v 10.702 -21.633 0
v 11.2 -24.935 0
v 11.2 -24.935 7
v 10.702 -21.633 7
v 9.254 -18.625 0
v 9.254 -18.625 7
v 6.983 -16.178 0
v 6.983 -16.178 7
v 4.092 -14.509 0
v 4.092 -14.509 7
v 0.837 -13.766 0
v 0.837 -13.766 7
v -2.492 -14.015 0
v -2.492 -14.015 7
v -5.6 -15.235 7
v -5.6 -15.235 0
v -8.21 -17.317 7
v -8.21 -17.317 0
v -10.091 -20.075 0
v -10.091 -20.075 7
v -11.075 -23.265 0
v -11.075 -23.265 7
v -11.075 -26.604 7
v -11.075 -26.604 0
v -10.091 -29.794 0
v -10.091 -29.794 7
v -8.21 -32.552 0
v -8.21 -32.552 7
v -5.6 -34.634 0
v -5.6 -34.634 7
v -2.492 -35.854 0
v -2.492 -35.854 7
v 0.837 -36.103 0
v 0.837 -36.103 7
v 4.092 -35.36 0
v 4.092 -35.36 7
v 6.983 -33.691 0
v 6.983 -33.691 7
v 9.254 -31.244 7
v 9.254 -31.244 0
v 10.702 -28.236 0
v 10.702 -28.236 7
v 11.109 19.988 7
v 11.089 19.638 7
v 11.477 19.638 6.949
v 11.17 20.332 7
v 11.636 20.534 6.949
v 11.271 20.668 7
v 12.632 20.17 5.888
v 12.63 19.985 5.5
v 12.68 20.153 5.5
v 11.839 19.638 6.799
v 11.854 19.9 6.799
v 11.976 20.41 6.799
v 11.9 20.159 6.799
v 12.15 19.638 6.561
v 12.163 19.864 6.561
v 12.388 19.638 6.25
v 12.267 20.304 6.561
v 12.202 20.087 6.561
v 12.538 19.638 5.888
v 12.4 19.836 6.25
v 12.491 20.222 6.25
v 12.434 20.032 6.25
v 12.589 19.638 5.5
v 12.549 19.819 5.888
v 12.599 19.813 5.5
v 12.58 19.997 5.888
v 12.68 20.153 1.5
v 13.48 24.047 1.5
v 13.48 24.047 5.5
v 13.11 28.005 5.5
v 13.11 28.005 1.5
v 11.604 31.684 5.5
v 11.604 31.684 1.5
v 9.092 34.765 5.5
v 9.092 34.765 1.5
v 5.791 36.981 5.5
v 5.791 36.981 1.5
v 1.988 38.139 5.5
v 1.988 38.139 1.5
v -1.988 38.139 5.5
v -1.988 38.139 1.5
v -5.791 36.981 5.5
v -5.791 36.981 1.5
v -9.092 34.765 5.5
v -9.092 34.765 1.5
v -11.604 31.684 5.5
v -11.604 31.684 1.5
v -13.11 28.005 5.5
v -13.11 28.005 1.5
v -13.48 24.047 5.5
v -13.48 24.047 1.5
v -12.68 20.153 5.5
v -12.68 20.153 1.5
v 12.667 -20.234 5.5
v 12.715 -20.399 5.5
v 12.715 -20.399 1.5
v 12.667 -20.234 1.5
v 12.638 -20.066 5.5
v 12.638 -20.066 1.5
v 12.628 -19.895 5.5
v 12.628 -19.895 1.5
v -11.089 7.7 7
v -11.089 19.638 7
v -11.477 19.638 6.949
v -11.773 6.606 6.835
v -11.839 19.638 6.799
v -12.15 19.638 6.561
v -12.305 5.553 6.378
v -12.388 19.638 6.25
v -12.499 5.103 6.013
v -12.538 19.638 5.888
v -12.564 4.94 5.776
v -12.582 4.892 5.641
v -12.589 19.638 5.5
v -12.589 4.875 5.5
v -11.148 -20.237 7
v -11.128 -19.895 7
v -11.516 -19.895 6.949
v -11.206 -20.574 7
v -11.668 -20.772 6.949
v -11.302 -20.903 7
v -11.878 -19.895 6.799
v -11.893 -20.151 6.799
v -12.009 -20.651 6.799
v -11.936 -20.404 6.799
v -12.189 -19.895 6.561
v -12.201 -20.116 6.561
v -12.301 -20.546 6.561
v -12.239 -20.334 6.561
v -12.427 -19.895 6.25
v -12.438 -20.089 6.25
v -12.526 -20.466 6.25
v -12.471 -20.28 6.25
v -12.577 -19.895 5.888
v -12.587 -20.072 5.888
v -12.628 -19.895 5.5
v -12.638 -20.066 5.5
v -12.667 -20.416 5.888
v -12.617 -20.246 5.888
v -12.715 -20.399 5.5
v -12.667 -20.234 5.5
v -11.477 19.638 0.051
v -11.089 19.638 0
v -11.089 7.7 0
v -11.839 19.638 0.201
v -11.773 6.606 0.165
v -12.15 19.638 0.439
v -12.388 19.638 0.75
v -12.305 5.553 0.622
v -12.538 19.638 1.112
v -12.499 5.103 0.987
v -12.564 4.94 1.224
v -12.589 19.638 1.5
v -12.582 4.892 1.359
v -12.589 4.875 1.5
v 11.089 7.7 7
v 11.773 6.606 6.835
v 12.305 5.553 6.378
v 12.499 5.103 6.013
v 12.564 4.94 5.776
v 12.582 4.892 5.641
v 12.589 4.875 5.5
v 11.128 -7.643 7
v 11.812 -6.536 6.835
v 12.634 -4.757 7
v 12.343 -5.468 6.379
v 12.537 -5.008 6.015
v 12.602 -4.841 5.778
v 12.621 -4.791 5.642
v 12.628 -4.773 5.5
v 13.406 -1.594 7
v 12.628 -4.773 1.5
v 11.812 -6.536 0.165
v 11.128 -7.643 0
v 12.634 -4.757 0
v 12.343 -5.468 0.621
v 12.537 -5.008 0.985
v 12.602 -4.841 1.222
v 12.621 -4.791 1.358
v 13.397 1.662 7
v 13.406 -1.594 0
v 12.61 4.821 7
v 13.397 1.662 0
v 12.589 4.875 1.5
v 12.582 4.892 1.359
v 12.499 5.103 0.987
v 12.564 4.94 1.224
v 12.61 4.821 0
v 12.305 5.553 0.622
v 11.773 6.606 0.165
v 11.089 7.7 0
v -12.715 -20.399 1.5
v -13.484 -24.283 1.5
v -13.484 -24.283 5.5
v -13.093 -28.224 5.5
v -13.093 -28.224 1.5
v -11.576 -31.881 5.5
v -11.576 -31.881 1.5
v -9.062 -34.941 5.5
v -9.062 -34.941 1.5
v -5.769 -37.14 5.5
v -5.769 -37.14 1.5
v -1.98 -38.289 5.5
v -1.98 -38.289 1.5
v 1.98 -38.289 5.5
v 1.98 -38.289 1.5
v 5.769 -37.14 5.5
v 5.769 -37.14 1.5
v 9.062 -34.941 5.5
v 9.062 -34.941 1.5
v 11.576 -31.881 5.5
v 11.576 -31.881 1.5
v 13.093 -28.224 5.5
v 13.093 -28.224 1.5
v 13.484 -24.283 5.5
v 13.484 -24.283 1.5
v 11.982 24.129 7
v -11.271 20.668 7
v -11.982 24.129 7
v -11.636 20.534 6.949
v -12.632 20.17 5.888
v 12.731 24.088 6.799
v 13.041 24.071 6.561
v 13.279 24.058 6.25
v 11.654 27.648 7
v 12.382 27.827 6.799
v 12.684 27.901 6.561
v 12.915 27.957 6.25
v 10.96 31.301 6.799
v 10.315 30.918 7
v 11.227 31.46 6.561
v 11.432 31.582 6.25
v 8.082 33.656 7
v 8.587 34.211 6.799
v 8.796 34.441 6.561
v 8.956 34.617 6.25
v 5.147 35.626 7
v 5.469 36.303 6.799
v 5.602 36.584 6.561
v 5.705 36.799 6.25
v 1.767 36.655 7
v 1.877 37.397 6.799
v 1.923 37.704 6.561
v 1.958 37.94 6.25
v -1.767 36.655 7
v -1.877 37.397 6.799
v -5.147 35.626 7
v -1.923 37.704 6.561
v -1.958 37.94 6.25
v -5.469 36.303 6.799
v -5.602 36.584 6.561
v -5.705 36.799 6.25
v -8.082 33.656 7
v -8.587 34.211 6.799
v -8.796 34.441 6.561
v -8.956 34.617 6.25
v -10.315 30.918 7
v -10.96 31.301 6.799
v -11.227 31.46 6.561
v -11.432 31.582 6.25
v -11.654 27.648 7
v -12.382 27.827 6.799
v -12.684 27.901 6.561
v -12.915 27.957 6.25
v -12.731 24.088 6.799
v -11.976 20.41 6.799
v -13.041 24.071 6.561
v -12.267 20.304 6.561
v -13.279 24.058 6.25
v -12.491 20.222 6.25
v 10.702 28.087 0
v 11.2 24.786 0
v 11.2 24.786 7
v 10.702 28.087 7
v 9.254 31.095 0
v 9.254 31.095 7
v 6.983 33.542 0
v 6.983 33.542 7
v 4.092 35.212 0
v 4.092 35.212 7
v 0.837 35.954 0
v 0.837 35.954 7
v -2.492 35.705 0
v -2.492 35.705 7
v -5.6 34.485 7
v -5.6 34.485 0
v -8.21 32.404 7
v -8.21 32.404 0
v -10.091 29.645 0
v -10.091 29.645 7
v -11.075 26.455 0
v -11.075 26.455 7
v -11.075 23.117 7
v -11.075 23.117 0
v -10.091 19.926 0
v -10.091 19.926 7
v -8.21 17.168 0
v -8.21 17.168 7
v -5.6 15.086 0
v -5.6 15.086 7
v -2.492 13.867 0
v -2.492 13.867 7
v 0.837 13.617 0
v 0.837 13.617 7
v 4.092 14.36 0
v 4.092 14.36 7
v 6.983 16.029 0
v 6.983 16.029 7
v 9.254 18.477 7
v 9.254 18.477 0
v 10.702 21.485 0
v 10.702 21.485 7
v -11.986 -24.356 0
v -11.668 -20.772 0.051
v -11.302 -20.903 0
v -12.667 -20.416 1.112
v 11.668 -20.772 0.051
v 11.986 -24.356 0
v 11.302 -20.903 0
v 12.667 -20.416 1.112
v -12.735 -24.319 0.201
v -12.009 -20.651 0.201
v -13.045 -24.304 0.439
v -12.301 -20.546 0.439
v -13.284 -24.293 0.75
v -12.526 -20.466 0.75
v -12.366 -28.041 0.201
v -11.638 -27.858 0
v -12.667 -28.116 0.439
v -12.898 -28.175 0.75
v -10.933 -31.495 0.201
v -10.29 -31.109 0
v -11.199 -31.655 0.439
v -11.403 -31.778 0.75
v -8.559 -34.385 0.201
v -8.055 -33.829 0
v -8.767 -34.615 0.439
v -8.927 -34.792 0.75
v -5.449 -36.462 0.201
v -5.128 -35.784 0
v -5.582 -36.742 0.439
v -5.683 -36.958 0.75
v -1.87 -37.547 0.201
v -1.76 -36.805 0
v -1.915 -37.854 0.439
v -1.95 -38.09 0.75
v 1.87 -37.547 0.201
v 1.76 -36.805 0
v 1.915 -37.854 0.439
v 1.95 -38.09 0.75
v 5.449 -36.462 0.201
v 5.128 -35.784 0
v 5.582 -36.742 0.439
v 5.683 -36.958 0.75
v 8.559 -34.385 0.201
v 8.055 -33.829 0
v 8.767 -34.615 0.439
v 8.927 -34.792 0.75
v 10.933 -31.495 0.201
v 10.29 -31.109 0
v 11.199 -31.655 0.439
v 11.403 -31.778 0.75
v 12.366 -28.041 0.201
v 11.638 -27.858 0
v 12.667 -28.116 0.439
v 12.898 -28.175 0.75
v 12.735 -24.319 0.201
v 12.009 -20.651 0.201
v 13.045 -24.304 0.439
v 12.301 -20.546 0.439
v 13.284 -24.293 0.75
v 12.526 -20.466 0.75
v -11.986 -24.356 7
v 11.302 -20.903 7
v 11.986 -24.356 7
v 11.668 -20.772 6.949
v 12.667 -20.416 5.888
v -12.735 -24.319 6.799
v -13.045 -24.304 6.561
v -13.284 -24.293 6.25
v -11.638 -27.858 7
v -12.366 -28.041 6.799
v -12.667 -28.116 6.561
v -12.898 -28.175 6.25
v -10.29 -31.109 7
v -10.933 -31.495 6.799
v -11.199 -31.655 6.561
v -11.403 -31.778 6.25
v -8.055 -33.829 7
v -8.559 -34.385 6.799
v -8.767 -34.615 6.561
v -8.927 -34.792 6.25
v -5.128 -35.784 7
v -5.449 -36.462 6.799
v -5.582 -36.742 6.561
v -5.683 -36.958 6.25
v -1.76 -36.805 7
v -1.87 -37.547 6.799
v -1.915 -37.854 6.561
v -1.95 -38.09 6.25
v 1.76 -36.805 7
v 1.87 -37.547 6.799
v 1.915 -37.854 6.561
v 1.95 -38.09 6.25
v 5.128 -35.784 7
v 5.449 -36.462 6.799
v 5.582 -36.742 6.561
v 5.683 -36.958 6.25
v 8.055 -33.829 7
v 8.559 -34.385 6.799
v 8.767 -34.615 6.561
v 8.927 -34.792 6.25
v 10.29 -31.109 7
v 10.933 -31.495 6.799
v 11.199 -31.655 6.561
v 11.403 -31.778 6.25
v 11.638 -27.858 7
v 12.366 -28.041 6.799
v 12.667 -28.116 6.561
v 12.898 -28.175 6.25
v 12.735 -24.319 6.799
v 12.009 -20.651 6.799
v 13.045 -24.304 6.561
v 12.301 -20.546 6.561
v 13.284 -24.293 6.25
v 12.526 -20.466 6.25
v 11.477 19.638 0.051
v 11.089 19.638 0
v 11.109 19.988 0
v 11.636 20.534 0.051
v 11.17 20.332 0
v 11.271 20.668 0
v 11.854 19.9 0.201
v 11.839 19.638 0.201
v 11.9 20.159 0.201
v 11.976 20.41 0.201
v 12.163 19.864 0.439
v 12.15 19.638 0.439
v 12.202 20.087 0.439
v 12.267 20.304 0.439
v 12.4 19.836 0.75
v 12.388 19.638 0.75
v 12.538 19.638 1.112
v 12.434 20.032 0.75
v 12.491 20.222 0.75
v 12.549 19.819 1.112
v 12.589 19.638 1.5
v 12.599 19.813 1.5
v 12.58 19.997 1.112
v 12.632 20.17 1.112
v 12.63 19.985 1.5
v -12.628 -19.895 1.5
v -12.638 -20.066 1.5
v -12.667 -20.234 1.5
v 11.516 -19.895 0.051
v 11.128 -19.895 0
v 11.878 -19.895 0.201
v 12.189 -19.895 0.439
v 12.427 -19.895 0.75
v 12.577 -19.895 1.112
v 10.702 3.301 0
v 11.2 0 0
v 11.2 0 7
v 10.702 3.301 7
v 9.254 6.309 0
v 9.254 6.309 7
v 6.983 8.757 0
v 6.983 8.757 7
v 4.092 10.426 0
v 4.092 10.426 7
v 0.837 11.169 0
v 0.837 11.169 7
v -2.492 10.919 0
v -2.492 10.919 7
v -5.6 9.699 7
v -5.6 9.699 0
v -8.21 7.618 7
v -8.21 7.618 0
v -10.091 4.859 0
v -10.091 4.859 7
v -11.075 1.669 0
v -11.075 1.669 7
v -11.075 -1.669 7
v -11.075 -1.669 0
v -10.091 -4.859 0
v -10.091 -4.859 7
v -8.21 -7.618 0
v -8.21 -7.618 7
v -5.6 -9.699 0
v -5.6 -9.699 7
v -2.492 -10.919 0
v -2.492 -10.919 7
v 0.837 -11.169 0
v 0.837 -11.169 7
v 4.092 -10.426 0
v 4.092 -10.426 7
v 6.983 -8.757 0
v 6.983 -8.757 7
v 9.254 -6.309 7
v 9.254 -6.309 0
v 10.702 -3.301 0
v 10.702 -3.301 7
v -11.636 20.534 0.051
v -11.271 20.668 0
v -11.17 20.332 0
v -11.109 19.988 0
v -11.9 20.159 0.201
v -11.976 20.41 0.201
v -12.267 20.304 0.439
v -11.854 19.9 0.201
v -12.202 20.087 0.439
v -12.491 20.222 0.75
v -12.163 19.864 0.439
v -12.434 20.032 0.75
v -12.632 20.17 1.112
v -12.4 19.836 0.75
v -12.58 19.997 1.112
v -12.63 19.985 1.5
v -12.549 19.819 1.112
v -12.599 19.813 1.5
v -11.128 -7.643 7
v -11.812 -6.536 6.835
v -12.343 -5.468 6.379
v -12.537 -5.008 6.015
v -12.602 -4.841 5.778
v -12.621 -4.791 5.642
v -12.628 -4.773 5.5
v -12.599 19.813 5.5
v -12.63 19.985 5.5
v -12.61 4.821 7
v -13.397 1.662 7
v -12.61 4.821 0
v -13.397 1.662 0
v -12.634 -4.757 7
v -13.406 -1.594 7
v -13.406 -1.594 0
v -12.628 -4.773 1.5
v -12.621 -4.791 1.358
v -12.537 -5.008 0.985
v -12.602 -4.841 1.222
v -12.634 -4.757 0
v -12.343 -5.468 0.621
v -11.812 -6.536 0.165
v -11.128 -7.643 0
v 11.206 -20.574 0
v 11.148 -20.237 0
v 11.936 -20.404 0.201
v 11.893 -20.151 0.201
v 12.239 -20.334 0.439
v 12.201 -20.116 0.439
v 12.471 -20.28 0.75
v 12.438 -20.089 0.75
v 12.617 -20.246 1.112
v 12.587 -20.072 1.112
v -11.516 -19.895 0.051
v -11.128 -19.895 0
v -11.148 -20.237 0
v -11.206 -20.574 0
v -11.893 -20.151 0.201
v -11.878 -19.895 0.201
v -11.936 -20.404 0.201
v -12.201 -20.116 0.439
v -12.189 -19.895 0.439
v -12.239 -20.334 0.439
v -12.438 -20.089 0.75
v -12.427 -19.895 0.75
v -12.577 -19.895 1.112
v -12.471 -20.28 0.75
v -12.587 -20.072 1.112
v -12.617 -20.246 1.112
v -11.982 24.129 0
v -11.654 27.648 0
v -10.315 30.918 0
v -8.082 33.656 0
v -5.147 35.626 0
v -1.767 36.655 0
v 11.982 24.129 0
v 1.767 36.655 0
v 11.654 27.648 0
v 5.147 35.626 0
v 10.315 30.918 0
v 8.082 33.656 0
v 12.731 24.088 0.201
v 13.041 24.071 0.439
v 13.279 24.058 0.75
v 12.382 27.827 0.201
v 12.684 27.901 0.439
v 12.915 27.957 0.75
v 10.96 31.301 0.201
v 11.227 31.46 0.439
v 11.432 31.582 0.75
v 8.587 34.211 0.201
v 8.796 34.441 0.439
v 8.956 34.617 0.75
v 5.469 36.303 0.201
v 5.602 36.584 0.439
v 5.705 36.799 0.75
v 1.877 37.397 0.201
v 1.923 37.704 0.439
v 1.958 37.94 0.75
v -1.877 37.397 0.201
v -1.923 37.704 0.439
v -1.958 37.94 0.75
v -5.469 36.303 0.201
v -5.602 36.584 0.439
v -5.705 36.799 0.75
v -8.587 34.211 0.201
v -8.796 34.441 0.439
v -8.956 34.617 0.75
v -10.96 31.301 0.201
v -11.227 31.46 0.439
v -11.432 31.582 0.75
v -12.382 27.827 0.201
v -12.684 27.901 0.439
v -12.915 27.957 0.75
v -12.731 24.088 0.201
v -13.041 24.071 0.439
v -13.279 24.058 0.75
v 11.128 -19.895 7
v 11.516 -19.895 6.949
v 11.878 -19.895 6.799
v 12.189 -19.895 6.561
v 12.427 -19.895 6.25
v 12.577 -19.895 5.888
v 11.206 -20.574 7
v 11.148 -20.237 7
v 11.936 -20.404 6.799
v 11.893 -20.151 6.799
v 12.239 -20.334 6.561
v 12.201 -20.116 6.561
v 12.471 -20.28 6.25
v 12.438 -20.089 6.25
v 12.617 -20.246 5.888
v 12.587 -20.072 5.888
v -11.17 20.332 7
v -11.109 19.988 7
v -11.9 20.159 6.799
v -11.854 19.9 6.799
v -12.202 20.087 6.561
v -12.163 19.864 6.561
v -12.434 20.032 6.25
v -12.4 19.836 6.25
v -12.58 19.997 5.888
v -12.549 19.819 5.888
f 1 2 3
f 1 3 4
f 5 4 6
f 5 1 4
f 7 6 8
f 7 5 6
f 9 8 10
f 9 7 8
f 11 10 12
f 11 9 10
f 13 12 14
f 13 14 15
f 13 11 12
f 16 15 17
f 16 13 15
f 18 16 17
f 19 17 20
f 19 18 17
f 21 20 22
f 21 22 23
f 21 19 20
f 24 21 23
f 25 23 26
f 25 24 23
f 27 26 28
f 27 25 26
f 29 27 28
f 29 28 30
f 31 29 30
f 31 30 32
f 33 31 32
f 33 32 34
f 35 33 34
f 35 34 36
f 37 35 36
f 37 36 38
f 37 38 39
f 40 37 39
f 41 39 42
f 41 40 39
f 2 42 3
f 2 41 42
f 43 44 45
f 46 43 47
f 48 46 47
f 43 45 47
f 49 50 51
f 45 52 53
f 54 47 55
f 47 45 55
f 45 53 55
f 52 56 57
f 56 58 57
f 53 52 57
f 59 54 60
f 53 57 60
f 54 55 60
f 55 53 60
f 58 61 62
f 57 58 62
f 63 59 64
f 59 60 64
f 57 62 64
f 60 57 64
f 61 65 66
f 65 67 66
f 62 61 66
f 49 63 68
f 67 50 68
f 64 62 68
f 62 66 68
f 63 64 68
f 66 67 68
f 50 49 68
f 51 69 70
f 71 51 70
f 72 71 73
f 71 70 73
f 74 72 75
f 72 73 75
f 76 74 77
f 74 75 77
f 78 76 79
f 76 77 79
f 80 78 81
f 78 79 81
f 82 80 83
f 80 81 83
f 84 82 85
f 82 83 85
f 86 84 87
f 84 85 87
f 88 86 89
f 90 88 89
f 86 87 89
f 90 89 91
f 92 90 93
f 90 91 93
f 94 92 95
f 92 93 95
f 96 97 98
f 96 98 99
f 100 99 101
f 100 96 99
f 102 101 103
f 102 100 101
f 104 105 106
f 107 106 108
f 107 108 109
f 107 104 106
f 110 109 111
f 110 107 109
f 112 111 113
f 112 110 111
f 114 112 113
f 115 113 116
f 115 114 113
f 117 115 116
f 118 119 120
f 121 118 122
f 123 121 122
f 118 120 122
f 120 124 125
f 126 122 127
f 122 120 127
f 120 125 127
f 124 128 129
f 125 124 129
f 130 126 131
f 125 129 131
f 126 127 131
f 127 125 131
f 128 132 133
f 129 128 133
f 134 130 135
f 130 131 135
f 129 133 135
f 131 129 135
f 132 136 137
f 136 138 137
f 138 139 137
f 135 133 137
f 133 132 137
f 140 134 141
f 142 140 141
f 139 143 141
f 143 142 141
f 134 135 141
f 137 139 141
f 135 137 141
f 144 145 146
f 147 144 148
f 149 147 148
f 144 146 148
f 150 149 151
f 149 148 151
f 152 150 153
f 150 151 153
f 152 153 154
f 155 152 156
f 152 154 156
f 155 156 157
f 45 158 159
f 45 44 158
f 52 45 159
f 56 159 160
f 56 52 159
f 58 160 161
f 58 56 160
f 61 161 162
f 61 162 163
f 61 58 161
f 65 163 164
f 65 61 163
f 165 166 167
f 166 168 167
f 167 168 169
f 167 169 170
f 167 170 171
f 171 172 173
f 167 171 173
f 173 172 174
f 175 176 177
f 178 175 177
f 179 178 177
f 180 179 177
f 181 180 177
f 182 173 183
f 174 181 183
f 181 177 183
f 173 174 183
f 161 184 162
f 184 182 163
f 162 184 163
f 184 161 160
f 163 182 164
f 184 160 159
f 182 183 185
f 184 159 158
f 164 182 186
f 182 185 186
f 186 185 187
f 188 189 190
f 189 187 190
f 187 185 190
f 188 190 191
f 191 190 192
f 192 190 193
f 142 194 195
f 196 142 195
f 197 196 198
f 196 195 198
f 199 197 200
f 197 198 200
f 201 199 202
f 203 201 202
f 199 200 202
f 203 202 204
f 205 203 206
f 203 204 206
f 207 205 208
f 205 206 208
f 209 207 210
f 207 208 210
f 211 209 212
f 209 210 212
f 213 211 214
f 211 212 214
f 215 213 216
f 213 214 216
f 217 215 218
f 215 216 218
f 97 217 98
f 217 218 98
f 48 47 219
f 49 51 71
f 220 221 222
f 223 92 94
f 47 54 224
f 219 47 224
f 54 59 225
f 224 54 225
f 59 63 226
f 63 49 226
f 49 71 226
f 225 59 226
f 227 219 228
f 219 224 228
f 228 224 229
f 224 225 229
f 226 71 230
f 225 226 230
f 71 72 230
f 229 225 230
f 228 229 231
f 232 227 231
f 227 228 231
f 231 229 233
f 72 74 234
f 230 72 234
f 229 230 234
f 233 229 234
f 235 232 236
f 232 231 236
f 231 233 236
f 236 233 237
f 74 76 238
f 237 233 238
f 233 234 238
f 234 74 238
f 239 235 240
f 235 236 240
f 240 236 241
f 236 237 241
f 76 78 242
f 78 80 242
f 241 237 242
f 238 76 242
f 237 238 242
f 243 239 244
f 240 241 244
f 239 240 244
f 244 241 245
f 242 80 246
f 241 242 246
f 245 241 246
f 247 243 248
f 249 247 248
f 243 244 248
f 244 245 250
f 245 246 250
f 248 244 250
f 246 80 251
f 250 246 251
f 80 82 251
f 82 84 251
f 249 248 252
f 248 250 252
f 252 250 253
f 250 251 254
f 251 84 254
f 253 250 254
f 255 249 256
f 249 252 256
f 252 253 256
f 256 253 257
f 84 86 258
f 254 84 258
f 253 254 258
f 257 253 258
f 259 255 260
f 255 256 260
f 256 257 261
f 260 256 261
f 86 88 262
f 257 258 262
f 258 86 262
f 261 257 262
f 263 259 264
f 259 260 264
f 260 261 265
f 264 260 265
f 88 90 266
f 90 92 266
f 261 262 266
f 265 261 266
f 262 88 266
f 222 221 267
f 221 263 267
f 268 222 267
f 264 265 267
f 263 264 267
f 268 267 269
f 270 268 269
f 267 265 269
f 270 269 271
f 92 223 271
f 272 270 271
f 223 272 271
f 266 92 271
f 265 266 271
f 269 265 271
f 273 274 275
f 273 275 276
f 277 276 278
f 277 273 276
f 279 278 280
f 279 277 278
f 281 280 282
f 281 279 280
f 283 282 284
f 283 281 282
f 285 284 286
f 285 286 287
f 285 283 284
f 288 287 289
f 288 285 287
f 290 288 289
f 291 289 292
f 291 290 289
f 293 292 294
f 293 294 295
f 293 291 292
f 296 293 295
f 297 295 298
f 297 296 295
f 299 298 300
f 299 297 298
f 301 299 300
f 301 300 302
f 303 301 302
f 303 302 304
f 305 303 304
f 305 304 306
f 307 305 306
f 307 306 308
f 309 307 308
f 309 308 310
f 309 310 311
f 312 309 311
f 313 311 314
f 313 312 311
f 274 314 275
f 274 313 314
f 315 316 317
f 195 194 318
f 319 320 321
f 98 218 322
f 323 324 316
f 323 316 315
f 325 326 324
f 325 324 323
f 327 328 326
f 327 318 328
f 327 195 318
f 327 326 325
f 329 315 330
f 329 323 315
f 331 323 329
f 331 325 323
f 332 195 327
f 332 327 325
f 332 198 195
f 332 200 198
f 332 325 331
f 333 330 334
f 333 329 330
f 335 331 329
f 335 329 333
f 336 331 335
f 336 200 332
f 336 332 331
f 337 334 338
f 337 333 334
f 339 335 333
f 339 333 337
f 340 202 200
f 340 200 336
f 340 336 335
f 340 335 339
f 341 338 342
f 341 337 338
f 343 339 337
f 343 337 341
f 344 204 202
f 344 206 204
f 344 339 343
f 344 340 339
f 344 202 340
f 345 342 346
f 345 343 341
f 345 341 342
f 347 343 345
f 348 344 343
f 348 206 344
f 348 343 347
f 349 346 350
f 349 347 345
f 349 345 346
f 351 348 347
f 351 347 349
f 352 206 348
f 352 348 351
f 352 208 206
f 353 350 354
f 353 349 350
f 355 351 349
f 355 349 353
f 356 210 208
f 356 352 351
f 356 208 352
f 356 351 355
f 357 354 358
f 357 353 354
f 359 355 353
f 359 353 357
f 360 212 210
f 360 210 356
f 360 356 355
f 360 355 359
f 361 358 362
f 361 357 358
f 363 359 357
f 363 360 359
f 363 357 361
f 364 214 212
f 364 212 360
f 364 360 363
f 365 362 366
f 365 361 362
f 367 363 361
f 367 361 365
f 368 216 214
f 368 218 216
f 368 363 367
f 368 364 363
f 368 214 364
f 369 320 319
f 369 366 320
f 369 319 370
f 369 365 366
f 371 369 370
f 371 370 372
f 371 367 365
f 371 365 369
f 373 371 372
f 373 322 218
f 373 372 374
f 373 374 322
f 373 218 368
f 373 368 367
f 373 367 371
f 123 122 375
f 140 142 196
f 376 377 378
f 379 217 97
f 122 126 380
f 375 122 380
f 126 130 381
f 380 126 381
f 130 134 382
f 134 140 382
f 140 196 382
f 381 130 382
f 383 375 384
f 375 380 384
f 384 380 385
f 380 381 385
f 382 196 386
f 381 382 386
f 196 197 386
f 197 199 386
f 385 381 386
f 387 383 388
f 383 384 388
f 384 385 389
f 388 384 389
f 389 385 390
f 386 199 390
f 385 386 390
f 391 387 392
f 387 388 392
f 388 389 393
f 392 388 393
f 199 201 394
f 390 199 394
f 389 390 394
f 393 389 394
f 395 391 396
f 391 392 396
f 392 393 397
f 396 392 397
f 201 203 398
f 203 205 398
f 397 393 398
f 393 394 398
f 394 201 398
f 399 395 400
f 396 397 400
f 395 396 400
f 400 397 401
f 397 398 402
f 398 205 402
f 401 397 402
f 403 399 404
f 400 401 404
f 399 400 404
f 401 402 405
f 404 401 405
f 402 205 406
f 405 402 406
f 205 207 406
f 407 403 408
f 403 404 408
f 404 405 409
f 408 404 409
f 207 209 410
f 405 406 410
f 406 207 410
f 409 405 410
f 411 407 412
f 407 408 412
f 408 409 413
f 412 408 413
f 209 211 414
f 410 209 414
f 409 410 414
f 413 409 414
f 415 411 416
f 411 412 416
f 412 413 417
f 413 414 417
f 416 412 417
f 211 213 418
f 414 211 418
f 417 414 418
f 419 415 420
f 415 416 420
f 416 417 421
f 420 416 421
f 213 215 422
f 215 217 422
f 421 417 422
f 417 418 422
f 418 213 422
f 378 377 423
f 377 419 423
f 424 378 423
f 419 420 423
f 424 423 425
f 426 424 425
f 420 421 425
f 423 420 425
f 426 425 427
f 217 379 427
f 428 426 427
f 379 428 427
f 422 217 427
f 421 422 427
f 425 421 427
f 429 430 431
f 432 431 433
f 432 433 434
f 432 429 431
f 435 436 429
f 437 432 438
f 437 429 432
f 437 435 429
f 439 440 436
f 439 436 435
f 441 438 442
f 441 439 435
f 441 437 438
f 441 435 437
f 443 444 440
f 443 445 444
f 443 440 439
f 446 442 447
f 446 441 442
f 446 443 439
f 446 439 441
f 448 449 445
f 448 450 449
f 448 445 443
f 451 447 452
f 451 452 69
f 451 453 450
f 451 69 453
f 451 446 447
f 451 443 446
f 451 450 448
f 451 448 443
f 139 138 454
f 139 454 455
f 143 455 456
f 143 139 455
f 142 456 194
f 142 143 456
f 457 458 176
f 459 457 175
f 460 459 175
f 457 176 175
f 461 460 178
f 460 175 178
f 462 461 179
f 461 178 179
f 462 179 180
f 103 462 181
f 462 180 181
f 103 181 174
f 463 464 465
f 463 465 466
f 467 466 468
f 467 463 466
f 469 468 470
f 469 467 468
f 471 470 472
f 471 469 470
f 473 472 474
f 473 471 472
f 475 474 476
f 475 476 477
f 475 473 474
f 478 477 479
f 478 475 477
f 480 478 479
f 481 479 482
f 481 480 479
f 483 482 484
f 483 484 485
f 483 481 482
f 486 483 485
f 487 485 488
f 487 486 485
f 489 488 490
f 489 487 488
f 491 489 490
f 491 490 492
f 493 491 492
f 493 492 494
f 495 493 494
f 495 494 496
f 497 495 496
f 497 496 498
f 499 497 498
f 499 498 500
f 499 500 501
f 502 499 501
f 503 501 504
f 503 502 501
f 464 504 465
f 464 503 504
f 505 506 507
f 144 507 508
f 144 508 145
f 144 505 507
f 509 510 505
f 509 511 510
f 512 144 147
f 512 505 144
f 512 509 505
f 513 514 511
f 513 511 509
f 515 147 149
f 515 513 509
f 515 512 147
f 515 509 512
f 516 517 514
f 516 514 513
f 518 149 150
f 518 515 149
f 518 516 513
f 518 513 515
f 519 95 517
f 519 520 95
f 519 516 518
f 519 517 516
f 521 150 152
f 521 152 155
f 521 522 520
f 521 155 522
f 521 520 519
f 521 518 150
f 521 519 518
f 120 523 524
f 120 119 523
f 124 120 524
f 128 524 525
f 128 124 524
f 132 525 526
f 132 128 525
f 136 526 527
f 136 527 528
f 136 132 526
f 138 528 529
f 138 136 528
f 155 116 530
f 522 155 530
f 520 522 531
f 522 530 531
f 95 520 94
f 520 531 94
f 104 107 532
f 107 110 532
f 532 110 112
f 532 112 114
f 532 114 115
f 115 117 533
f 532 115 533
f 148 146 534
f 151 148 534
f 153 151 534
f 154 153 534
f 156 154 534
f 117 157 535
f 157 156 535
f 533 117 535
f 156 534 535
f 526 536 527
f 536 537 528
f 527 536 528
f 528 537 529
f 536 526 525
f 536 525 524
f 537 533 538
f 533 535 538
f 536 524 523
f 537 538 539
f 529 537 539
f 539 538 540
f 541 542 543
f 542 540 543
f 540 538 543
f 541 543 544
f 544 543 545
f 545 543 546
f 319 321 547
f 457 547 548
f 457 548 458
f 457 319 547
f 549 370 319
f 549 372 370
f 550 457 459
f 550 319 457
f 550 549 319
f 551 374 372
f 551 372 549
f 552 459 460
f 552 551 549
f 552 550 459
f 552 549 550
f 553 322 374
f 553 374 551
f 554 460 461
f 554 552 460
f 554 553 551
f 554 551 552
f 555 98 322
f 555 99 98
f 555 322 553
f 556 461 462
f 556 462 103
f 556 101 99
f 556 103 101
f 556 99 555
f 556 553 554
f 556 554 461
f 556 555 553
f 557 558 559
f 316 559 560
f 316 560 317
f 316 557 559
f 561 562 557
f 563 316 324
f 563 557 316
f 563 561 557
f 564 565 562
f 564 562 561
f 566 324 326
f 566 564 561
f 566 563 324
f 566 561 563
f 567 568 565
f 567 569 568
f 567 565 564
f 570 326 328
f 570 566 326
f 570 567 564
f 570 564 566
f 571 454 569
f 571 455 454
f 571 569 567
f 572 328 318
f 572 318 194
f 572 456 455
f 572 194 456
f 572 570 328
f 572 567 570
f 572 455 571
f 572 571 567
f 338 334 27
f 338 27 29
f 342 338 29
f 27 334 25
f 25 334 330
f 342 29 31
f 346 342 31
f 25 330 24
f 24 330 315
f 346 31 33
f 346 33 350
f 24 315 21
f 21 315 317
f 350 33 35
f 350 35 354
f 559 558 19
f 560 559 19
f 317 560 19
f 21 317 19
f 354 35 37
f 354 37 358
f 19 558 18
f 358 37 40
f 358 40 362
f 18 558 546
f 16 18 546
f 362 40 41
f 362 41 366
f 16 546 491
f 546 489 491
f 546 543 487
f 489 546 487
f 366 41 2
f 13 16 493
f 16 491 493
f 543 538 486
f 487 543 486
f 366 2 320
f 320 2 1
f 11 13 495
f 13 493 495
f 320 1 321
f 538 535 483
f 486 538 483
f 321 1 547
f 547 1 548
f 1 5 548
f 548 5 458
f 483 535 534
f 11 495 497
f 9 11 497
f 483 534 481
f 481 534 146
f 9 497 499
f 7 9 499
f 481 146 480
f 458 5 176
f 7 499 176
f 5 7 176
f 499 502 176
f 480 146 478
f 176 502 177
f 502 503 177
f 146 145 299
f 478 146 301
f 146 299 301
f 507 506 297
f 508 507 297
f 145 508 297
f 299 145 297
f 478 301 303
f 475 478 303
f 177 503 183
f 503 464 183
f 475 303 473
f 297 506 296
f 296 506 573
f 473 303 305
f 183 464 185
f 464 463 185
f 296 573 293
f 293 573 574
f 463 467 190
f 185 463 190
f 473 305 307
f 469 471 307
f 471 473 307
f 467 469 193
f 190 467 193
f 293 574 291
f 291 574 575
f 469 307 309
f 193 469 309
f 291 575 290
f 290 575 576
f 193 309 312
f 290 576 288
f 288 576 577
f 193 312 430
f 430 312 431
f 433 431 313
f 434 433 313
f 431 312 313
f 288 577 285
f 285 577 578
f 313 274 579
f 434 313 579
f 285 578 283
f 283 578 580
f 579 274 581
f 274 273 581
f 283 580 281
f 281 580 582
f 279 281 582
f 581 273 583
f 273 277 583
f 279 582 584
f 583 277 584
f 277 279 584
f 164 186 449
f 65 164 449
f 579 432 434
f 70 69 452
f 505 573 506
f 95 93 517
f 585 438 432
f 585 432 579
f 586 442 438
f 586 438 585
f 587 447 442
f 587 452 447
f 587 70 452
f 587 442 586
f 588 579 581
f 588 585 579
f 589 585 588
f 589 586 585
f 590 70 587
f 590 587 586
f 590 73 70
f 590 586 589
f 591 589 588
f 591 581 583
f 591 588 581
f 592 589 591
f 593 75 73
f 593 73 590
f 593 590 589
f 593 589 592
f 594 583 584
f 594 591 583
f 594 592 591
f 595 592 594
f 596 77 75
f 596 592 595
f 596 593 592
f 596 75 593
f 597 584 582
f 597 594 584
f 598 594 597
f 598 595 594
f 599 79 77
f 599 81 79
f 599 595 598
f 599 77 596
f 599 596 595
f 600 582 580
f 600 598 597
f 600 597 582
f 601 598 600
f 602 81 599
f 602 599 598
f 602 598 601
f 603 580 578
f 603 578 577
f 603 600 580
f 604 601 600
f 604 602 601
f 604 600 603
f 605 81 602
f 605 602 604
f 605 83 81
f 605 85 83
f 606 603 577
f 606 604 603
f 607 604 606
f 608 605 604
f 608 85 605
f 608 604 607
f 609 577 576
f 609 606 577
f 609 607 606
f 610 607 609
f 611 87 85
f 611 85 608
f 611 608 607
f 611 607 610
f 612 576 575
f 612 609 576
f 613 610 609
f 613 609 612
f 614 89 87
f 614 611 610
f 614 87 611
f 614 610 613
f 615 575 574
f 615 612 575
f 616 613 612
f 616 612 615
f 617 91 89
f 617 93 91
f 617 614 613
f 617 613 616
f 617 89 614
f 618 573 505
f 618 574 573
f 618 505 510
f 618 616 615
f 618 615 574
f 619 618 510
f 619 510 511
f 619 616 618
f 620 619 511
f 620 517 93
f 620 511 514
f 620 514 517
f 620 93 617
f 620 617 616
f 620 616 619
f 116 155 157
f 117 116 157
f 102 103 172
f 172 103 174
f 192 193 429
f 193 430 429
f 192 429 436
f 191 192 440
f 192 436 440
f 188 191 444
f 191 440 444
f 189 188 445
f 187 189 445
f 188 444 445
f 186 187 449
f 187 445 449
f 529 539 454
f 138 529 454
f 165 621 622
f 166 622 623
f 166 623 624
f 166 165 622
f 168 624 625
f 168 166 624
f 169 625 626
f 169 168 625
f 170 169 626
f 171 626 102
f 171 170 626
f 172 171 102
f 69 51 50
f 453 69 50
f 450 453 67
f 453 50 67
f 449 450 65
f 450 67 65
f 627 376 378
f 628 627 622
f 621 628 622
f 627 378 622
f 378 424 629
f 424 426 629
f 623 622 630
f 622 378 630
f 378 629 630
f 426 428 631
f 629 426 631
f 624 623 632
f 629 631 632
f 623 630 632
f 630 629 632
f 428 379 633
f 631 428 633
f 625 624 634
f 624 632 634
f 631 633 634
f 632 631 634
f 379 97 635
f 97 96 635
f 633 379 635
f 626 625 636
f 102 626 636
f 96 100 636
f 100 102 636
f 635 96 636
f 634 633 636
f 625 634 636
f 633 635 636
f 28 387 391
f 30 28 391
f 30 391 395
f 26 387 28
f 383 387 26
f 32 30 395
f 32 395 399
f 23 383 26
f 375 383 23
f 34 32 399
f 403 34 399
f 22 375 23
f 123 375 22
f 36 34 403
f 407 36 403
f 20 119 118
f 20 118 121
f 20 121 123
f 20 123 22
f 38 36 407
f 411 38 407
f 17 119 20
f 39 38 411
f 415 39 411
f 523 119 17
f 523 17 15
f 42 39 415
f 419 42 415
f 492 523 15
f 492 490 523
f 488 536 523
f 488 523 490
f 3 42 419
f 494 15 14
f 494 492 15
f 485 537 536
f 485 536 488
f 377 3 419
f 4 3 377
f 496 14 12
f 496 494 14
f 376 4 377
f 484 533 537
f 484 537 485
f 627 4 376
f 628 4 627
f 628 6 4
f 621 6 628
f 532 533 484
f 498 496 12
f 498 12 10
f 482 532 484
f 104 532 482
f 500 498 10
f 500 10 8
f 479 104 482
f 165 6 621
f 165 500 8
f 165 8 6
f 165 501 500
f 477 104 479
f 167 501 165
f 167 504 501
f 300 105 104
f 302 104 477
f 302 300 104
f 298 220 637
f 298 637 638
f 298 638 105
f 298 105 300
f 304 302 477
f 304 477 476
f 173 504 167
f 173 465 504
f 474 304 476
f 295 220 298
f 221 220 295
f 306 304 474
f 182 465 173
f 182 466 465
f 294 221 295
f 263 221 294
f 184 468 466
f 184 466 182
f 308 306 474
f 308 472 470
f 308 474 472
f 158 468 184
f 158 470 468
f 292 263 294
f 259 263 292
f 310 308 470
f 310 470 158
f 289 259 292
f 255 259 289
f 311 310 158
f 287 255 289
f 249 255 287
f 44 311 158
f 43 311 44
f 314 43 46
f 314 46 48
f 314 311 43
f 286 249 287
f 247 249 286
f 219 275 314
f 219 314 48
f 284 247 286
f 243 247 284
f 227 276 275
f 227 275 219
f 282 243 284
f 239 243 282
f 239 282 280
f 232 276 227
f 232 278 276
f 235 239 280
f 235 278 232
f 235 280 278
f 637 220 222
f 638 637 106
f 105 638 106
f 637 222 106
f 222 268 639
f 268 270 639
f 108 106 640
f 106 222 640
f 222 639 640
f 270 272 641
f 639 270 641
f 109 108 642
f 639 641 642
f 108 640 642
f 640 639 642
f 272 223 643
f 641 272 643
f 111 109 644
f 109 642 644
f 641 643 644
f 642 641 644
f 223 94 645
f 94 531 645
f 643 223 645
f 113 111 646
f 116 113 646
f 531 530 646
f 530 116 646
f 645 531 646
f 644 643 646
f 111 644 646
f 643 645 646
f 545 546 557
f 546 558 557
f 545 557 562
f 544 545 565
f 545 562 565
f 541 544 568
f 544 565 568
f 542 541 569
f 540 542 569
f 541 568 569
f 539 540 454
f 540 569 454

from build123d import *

# Parameters (mm, degrees)
F0_R     = 11.2
F1_DEPTH = 7
F2_F1_R  = 1.5
F2_F2_R  = 1.5


with BuildPart() as f1:
    # F0 (on Top) → F1 (new body)
    with BuildSketch(Plane.XY):
        with BuildLine():
            Line((-12.5890504837, 19.9107848701), (-12.5890504837, 4.8750187608))
            ThreePointArc((-12.5890504837, 4.8750187608), (-13.4998898549, 0.0545335167), (-12.6280247824, -4.773153056))
            Line((-12.6280247824, -4.773153056), (-12.6280247824, -20.1613976912))
            ThreePointArc((-12.6280247824, -20.1613976912), (0, -38.4345507473), (12.6280247824, -20.1613976912))
            Line((12.6280247824, -20.1613976912), (12.6280247824, -4.773153056))
            ThreePointArc((12.6280247824, -4.773153056), (13.4998898549, 0.0545335167), (12.5890504837, 4.8750187608))
            Line((12.5890504837, 4.8750187608), (12.5890504837, 19.9107848701))
            ThreePointArc((12.5890504837, 19.9107848701), (0, 38.2858036309), (-12.5890504837, 19.9107848701))
        make_face()
        with Locations((0, -24.9345507473)):
            Circle(F0_R, mode=Mode.SUBTRACT)
        Circle(F0_R, mode=Mode.SUBTRACT)
        with Locations((0, 24.7858036309)):
            Circle(F0_R, mode=Mode.SUBTRACT)
    extrude(amount=F1_DEPTH)

    # F2: fillet of radius 1.5 on 8 edges, made by hand

    # F2_f1
    f2_f1_edges = [f1.edges().sort_by_distance(p)[0] for p in [
        (12.5890504837, 19.9107848701, 3.5),
        (-12.5890504837, 19.9107848701, 3.5),
        (-12.6280247824, -20.1613976912, 3.5),
        (12.6280247824, -20.1613976912, 3.5),
    ]]
    fillet(f2_f1_edges, radius=F2_F1_R)

    # F2_f2
    f2_f2_edges = [f1.edges().sort_by_distance(p)[0] for p in [
        (0, 38.2858036309, 0),
        (0, 38.2858036309, 7),
        (0, -38.4345507473, 0),
        (0, -38.4345507473, 7),
        (-12.6499849119, -20.1505476521, 7),
        (12.6499849119, -20.1505476521, 7),
        (-12.6499849119, -20.1505476521, 0),
        (12.6499849119, -20.1505476521, 0),
        (12.6119997783, 19.8995023273, 7),
        (-12.6119997783, 19.8995023273, 7),
        (12.6119997783, 19.8995023273, 0),
        (-12.6119997783, 19.8995023273, 0),
    ]]
    fillet(f2_f2_edges, radius=F2_F2_R)


solid = f1.part
